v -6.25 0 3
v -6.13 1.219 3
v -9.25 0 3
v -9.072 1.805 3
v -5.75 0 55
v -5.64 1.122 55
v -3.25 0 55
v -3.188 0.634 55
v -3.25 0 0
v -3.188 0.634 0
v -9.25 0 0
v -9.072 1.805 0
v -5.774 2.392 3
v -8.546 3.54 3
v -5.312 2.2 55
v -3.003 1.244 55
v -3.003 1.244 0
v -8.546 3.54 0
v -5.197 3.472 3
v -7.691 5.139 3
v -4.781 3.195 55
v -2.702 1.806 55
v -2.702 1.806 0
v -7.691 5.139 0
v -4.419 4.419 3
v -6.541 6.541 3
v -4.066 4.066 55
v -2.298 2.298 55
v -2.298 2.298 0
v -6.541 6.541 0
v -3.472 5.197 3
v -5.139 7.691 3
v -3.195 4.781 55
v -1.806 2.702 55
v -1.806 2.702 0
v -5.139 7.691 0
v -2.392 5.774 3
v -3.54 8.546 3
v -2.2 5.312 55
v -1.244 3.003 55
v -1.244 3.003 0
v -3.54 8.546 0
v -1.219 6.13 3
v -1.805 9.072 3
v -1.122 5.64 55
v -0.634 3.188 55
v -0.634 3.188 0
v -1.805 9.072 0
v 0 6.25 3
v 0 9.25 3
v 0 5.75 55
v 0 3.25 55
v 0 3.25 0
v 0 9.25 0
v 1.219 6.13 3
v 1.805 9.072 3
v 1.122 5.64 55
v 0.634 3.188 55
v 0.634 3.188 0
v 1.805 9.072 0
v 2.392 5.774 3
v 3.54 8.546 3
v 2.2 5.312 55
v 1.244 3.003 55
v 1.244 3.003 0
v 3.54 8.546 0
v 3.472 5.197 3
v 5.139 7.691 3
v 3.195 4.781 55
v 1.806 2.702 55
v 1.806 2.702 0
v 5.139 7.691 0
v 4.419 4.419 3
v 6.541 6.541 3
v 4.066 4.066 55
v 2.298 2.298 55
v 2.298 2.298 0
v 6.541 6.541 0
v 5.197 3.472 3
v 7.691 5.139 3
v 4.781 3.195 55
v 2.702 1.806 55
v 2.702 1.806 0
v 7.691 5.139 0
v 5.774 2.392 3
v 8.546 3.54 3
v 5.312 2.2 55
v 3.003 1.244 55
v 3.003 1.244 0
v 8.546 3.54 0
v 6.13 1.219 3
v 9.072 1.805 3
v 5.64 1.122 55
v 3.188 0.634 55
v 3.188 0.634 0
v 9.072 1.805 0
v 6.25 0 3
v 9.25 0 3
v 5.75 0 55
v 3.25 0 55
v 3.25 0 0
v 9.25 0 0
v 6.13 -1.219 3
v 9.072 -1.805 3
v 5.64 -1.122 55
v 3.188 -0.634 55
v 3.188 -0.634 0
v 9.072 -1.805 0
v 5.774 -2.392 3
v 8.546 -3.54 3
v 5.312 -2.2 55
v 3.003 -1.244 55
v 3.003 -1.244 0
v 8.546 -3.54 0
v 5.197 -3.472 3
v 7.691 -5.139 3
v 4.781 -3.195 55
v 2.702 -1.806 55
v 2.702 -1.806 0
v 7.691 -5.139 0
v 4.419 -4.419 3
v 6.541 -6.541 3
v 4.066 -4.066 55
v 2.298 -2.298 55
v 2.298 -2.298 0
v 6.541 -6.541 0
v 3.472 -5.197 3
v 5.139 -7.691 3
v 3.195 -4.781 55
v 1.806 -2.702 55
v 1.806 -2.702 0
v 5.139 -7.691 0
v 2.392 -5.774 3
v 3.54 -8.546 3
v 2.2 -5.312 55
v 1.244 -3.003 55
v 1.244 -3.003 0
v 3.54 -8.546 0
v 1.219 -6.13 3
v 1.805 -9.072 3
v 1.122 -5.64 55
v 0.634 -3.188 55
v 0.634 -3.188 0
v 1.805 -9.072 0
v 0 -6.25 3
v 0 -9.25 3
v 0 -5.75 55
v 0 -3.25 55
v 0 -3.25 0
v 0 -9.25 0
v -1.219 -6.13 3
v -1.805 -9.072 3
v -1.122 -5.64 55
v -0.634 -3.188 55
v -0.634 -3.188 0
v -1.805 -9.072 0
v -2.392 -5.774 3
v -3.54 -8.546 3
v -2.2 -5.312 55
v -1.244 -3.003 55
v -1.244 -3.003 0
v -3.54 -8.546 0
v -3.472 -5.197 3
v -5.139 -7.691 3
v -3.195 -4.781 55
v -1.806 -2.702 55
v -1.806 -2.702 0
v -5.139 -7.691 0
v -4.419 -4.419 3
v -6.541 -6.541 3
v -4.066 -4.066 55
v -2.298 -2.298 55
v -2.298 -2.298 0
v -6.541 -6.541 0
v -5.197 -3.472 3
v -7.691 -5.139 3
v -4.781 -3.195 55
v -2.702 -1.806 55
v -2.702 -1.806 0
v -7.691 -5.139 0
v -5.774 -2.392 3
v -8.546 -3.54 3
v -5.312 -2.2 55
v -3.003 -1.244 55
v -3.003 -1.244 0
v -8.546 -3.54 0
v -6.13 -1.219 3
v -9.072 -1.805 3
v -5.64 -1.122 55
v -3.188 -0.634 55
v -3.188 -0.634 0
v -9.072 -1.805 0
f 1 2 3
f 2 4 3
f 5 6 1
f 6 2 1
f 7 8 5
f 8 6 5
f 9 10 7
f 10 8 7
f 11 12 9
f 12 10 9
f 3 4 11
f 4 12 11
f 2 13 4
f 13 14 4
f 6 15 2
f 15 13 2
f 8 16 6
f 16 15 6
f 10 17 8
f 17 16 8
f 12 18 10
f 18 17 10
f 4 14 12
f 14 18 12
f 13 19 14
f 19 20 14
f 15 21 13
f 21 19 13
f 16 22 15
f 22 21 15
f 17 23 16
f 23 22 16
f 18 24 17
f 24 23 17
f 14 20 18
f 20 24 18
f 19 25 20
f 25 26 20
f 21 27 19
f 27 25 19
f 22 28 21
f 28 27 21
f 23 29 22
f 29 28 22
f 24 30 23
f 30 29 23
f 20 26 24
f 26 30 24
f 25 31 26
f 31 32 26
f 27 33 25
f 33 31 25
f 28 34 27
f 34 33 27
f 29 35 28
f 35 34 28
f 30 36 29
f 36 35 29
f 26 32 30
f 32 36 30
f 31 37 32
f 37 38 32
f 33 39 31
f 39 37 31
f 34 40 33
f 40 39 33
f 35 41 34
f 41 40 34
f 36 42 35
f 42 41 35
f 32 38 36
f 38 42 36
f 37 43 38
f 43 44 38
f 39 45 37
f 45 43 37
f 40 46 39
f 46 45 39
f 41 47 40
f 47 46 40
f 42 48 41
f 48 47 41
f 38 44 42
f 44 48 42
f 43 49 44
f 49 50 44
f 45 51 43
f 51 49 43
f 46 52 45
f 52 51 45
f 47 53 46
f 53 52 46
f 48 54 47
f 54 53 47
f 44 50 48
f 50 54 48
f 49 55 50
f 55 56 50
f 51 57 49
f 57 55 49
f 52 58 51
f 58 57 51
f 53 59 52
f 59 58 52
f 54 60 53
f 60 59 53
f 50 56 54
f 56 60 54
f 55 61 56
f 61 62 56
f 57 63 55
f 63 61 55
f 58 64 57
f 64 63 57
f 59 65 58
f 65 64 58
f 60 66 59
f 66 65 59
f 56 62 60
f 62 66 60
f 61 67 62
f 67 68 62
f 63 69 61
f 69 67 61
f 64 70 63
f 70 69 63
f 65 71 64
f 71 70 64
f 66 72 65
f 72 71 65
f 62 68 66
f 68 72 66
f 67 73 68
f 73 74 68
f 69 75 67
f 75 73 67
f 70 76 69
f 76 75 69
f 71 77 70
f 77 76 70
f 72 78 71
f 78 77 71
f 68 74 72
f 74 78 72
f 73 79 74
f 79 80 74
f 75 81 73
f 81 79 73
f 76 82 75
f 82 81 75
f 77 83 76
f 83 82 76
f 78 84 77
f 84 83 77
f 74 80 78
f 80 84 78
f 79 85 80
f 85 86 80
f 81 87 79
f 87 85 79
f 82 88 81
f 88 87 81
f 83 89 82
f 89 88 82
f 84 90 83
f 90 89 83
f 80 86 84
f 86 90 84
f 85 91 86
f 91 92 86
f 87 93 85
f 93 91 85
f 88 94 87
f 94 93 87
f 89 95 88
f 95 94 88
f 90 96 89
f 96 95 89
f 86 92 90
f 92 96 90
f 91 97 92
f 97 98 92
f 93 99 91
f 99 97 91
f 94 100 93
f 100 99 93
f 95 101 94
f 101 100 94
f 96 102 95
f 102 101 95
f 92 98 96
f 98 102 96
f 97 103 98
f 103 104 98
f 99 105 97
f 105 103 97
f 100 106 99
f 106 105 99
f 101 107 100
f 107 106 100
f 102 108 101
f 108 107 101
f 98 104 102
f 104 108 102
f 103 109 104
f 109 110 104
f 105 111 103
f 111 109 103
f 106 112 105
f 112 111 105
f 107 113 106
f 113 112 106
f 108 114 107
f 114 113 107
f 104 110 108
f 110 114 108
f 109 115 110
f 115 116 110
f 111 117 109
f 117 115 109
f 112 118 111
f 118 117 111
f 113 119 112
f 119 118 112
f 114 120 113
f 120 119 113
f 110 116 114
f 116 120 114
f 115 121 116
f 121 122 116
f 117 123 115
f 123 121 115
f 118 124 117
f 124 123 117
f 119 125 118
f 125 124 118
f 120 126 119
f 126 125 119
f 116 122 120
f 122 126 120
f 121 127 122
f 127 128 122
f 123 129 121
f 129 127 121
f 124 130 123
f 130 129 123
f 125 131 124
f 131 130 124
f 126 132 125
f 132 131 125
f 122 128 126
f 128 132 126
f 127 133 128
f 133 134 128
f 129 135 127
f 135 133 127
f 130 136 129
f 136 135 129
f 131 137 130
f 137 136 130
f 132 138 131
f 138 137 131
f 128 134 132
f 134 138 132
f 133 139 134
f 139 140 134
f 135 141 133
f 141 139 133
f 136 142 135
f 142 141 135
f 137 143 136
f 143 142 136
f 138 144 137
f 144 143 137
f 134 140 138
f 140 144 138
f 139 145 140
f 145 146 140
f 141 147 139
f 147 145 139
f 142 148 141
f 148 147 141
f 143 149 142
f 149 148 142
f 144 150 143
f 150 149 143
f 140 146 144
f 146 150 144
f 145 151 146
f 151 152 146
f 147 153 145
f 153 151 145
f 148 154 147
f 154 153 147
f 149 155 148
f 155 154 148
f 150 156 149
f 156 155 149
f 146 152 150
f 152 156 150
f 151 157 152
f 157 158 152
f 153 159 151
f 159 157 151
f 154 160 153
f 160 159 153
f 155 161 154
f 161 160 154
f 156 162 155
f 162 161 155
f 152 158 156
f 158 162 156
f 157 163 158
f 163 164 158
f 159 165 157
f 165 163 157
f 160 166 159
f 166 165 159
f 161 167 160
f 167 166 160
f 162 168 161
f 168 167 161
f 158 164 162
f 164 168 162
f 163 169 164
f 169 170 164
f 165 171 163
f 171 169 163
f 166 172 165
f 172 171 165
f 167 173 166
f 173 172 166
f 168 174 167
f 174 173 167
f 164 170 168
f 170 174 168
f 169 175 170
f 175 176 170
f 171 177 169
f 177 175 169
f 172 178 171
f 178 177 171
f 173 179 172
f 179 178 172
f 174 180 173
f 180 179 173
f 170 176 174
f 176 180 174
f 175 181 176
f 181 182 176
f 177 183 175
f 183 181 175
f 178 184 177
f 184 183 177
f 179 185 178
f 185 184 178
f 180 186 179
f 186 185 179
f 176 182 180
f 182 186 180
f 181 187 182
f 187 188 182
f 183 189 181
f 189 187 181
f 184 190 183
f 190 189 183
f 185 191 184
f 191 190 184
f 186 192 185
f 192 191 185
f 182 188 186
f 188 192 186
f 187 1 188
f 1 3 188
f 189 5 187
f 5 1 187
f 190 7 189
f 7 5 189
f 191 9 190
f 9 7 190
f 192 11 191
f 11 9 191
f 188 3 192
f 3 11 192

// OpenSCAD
$fn = 32;

// ----------------------------------------------------------------------
// Profiled standoff: conical spacer, 55 mm long, bore 6.5 mm
// ----------------------------------------------------------------------

// --- parameters (mm) ---
revolve_angle = 360;      // full turn around the Z axis
profile_points = 6;       // points of the closed outline

profile = [[3.25, 0], [9.25, 0], [9.25, 3], [6.25, 3], [5.75, 55], [3.25, 55]];  // single closed polygon, 6 points, counter clockwise

// --- the one profile operation ---
rotate_extrude(angle = revolve_angle) polygon(points = profile);
